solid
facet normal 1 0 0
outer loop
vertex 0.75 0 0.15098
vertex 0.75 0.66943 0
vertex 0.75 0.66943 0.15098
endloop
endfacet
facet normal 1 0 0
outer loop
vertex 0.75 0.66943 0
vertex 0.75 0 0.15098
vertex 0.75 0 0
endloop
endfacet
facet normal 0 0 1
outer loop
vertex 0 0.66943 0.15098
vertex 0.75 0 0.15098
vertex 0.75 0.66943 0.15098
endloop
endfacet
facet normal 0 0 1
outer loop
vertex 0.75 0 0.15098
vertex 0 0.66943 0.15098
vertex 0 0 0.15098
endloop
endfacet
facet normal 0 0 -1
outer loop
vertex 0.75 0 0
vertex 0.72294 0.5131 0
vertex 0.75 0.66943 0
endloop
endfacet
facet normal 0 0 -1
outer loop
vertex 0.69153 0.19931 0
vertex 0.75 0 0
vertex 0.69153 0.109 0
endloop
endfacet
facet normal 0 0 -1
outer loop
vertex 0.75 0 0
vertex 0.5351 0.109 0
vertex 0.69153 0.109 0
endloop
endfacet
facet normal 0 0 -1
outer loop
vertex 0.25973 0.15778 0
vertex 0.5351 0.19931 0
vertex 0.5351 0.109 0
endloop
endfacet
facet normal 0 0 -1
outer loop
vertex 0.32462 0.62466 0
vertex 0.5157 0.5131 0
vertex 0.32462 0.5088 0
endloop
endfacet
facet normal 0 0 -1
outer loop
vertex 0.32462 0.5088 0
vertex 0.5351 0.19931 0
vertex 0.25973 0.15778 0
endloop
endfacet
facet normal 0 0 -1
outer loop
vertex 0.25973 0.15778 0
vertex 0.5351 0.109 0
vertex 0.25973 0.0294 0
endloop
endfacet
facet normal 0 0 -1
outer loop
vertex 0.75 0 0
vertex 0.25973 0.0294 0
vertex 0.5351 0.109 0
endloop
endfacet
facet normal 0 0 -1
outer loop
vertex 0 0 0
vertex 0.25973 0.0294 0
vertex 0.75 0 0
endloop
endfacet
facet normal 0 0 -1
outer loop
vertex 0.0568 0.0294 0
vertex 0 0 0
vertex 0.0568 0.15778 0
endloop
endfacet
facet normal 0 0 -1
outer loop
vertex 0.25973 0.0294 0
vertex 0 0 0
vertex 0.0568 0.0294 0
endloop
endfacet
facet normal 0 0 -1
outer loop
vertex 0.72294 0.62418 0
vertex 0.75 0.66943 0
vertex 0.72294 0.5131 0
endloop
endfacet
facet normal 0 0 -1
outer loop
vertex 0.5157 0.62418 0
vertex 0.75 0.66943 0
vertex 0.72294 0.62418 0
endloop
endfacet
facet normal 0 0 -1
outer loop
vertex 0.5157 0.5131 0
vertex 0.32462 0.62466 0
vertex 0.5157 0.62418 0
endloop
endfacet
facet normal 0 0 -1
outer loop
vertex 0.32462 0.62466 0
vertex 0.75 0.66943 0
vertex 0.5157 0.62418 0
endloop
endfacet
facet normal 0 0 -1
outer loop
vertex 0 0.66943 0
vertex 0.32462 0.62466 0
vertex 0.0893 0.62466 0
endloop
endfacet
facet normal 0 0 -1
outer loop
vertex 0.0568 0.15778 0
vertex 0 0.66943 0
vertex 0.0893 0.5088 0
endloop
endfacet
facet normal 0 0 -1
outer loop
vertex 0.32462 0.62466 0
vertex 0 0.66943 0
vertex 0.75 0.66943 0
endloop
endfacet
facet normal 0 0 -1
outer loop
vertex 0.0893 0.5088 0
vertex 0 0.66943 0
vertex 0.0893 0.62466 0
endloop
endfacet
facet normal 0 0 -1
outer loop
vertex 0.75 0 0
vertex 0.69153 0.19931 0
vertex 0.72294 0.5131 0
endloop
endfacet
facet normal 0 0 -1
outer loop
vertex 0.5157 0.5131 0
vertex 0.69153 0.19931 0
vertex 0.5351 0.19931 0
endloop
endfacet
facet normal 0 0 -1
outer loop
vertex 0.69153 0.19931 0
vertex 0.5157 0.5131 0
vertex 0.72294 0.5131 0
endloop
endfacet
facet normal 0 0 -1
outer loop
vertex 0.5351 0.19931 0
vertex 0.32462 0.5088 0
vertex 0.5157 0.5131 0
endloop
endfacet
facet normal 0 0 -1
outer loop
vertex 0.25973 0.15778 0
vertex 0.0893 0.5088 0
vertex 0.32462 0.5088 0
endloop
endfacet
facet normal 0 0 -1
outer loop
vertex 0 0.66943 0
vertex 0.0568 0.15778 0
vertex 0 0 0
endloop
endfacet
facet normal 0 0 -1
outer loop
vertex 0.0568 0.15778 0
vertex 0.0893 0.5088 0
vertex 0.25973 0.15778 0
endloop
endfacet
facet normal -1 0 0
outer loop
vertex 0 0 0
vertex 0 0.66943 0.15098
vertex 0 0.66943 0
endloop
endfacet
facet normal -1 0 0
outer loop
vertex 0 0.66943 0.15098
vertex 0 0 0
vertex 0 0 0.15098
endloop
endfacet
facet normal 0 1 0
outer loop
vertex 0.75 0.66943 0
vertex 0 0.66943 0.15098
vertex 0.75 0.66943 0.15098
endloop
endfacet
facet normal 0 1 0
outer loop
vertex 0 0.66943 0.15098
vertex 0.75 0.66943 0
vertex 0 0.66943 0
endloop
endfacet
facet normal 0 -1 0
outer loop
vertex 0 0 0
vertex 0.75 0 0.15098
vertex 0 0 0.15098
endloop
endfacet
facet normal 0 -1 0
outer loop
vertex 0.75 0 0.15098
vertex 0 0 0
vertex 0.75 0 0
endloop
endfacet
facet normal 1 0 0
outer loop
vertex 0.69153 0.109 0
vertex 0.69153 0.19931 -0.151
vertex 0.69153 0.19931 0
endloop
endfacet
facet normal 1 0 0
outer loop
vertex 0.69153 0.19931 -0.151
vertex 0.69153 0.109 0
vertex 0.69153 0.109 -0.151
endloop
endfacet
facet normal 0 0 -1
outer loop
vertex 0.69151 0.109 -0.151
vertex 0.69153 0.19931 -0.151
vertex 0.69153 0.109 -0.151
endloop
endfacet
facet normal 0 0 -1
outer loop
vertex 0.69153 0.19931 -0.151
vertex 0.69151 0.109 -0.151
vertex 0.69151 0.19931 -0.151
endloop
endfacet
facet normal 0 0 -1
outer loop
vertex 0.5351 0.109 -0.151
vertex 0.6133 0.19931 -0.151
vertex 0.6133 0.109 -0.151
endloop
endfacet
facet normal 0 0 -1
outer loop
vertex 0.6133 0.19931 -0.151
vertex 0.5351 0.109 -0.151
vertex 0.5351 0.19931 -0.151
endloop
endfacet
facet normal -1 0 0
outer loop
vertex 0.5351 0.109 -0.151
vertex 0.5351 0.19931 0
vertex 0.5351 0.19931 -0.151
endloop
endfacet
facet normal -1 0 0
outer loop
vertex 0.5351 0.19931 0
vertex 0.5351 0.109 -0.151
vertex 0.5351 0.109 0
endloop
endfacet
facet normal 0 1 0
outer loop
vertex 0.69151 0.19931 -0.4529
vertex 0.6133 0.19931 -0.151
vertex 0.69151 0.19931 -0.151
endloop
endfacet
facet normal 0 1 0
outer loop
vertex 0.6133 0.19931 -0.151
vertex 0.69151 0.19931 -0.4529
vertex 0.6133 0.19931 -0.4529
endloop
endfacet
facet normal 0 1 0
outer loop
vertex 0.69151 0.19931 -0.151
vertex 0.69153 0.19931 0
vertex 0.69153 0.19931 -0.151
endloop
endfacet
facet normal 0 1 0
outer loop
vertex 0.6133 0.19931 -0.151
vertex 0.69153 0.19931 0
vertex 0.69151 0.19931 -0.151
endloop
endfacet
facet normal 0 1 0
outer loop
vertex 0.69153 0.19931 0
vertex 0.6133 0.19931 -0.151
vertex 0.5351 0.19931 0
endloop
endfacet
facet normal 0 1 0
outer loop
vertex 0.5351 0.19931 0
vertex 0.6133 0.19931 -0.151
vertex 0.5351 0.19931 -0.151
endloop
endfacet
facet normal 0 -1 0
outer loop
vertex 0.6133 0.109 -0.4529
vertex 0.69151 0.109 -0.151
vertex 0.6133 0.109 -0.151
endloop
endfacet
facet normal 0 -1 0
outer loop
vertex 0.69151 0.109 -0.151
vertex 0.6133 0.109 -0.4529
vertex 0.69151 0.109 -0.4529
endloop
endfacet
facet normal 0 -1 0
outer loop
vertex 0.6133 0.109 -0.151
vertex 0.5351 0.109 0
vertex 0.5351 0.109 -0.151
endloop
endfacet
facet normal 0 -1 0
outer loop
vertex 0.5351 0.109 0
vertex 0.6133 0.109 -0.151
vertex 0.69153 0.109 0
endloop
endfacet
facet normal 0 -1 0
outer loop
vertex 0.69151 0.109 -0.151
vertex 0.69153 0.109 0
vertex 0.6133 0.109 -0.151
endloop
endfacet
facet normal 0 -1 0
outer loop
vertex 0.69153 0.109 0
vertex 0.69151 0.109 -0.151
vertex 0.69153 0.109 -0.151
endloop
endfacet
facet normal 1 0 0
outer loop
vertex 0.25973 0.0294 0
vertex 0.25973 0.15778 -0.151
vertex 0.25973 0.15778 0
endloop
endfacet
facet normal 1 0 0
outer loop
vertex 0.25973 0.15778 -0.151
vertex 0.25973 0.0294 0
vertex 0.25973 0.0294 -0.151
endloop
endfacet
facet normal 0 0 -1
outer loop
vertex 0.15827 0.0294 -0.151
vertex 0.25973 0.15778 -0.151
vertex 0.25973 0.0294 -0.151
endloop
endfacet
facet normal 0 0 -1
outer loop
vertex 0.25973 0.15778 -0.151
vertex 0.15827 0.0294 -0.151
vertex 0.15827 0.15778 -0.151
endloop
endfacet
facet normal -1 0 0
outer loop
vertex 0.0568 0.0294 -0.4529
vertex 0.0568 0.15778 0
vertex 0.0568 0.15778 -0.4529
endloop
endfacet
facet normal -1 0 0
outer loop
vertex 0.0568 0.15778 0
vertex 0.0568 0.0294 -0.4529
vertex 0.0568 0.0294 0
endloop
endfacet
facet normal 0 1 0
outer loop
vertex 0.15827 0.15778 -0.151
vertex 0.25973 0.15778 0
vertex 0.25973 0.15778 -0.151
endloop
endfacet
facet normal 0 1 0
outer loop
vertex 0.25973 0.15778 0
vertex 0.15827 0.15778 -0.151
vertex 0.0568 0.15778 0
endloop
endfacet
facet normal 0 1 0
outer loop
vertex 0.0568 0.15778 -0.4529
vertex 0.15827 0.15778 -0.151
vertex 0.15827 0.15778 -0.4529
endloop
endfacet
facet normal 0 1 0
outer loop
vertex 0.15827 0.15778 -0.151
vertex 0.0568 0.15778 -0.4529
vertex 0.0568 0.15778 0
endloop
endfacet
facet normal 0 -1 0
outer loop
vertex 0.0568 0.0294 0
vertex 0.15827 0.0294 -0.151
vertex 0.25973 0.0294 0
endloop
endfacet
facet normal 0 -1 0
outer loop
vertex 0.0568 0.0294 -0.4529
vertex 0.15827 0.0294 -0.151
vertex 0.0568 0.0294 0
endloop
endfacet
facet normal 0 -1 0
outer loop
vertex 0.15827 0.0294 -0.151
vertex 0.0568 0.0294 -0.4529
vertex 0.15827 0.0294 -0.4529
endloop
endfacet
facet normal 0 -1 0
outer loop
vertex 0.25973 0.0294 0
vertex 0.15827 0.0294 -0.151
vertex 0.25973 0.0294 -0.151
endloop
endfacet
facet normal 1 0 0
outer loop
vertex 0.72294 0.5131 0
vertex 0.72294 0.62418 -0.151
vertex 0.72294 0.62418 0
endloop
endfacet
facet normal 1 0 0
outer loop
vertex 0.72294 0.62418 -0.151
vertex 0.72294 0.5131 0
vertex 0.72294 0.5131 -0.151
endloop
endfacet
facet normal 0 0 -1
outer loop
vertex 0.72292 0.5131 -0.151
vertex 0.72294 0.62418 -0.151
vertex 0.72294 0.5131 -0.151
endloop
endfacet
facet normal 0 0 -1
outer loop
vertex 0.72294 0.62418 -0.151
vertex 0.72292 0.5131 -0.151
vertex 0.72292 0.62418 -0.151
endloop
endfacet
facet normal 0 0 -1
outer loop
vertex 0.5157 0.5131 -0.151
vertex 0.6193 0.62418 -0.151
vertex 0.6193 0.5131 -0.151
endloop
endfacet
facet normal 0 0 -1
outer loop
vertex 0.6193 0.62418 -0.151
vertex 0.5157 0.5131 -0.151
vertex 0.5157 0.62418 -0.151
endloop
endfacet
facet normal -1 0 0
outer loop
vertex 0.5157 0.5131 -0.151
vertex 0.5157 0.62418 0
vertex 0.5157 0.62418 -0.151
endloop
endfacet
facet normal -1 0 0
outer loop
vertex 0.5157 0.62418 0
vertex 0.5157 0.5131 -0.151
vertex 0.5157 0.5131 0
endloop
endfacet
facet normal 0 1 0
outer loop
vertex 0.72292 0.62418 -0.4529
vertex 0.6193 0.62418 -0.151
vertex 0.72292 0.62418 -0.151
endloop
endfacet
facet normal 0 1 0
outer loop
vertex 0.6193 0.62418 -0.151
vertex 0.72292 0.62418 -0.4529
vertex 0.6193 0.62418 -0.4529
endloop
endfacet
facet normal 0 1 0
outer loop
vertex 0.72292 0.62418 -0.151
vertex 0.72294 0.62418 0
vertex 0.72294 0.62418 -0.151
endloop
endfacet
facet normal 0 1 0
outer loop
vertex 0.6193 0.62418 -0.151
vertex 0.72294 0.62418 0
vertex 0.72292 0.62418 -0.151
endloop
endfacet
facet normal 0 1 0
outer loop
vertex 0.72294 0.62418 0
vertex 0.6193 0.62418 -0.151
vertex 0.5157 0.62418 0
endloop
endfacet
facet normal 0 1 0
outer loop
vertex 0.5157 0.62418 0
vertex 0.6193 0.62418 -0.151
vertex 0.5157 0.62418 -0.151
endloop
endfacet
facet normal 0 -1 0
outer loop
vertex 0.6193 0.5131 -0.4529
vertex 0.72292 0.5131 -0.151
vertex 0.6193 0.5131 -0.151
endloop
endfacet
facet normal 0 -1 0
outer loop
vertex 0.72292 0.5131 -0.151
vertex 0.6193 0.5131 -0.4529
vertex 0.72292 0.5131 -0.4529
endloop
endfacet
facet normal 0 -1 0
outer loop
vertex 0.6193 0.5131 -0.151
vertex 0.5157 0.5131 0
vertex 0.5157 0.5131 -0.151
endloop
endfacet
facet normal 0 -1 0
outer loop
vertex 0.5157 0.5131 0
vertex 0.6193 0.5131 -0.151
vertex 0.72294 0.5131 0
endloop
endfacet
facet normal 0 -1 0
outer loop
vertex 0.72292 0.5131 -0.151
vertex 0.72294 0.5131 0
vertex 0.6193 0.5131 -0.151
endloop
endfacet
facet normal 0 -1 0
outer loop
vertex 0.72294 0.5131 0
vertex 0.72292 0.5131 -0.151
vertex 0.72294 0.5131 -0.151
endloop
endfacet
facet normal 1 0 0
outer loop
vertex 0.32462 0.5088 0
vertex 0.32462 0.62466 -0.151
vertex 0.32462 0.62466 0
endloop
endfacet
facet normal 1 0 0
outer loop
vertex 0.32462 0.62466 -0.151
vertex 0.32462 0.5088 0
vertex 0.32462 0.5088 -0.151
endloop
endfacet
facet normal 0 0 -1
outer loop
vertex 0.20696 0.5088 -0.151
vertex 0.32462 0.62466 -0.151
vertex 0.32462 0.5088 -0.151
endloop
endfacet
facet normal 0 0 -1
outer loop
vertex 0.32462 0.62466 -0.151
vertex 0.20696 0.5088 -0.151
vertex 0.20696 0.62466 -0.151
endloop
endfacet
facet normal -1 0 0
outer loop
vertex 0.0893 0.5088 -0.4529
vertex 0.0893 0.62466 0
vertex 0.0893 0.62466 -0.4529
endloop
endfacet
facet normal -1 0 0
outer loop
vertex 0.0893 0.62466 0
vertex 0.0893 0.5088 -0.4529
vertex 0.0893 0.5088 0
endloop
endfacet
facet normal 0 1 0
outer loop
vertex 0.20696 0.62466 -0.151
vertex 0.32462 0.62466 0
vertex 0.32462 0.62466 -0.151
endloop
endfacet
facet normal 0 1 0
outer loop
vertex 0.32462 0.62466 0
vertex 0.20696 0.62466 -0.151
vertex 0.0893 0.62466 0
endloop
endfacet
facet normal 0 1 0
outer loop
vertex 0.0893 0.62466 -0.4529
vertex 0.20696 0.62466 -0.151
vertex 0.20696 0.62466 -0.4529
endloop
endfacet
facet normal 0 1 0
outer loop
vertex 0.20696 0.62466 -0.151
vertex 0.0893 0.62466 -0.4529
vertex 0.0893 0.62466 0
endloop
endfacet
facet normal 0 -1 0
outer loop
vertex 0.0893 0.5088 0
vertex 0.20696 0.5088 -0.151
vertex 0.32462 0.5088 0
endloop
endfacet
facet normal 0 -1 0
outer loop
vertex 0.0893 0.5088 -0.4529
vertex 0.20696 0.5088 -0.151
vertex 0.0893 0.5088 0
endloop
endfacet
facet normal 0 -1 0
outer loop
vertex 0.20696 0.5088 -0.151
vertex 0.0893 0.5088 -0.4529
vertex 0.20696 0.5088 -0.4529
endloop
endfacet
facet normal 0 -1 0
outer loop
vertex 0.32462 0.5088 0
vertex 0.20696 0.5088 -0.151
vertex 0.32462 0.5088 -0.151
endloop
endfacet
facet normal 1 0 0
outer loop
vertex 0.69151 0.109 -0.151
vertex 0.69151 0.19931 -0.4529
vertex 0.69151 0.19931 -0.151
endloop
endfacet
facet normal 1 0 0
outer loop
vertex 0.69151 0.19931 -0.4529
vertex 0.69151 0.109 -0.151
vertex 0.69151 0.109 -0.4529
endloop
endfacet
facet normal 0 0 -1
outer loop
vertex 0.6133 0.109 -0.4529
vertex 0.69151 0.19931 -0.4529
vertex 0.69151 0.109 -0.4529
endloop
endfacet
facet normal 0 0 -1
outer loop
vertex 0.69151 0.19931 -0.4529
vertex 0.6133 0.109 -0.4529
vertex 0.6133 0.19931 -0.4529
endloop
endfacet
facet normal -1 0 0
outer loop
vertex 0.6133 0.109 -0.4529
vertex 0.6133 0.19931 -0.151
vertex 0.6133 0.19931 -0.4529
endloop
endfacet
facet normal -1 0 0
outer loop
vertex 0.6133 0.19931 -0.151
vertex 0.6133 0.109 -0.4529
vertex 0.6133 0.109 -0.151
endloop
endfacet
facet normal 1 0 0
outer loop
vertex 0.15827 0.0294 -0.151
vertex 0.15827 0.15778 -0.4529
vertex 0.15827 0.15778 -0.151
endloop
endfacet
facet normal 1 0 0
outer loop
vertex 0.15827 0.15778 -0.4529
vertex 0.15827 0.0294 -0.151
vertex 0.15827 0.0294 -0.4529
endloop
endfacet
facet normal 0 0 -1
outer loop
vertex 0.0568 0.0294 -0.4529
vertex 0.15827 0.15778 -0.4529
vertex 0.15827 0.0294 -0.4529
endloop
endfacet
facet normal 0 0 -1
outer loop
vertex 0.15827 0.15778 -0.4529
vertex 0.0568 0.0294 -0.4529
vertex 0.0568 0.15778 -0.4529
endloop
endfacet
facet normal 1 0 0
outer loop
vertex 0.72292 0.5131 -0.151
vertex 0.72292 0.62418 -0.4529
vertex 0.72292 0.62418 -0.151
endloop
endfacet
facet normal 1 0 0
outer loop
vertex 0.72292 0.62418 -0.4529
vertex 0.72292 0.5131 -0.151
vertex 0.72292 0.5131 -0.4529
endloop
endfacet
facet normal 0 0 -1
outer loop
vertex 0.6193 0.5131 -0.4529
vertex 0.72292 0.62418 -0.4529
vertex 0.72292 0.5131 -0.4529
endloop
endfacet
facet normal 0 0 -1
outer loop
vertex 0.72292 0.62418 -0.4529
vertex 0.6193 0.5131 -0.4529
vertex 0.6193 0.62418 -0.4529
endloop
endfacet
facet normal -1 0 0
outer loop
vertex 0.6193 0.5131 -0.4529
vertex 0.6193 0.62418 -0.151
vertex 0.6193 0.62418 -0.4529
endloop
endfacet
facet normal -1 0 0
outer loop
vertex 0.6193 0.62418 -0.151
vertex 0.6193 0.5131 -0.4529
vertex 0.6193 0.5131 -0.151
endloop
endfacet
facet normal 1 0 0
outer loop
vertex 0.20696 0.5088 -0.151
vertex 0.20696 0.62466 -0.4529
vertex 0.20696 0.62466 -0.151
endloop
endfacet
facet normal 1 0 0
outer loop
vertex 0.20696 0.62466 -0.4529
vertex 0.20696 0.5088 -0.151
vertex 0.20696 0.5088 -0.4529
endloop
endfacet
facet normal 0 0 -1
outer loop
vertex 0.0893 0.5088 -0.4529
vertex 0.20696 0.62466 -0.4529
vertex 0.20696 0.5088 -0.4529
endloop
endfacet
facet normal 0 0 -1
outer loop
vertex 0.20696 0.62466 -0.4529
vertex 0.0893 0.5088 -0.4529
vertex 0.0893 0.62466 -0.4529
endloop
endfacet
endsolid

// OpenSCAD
// Parameters
base_length = 0.75;
base_width = 0.669426;
base_height = 0.150979;
main_depth = 0.151;

// Shallow pad parameters
shallow_depth = 0.151;
pad1_size = [0.156427, 0.090313];
pad1_offsets = [0.5351, 0.0585, 0.109, 0.4701]; // left, right, front, back
pad2_size = [0.202932, 0.128382];
pad2_offsets = [0.0568, 0.4903, 0.0294, 0.5116];
pad3_size = [0.207237, 0.111076];
pad3_offsets = [0.5157, 0.0271, 0.5131, 0.0452];
pad4_size = [0.235324, 0.115862];
pad4_offsets = [0.0893, 0.4254, 0.5088, 0.0447];

// Deep continuation parameters
deep_depth = 0.302;
deep_start_offset = 0.1509;
cont1_size = [0.078214, 0.090313];
cont1_offsets = [0.6133, 0.0585, 0.109, 0.4701];
cont2_size = [0.101466, 0.128382];
cont2_offsets = [0.0568, 0.5917, 0.0294, 0.5116];
cont3_size = [0.103619, 0.111076];
cont3_offsets = [0.6193, 0.0271, 0.5131, 0.0452];
cont4_size = [0.117662, 0.115862];
cont4_offsets = [0.0893, 0.543, 0.5088, 0.0447];

$fn = 100;

// Main base module
module base() {
    cube([base_length, base_width, base_height], center = false);
}

// Pad module - creates rectangular pad at specified position
module pad(size, offsets, depth) {
    translate([offsets[0], offsets[2], -depth])
        cube([size[0], size[1], depth], center = false);
}

// Continuation module - creates deeper section below shallow pad
module continuation(size, offsets, depth, start_offset) {
    translate([offsets[0], offsets[2], -start_offset - depth])
        cube([size[0], size[1], depth], center = false);
}

// Main model assembly
union() {
    // Create base
    base();
    
    // Add shallow pads to underside
    pad(pad1_size, pad1_offsets, shallow_depth);
    pad(pad2_size, pad2_offsets, shallow_depth);
    pad(pad3_size, pad3_offsets, shallow_depth);
    pad(pad4_size, pad4_offsets, shallow_depth);
    
    // Add deep continuations below shallow pads
    continuation(cont1_size, cont1_offsets, deep_depth, deep_start_offset);
    continuation(cont2_size, cont2_offsets, deep_depth, deep_start_offset);
    continuation(cont3_size, cont3_offsets, deep_depth, deep_start_offset);
    continuation(cont4_size, cont4_offsets, deep_depth, deep_start_offset);
}
